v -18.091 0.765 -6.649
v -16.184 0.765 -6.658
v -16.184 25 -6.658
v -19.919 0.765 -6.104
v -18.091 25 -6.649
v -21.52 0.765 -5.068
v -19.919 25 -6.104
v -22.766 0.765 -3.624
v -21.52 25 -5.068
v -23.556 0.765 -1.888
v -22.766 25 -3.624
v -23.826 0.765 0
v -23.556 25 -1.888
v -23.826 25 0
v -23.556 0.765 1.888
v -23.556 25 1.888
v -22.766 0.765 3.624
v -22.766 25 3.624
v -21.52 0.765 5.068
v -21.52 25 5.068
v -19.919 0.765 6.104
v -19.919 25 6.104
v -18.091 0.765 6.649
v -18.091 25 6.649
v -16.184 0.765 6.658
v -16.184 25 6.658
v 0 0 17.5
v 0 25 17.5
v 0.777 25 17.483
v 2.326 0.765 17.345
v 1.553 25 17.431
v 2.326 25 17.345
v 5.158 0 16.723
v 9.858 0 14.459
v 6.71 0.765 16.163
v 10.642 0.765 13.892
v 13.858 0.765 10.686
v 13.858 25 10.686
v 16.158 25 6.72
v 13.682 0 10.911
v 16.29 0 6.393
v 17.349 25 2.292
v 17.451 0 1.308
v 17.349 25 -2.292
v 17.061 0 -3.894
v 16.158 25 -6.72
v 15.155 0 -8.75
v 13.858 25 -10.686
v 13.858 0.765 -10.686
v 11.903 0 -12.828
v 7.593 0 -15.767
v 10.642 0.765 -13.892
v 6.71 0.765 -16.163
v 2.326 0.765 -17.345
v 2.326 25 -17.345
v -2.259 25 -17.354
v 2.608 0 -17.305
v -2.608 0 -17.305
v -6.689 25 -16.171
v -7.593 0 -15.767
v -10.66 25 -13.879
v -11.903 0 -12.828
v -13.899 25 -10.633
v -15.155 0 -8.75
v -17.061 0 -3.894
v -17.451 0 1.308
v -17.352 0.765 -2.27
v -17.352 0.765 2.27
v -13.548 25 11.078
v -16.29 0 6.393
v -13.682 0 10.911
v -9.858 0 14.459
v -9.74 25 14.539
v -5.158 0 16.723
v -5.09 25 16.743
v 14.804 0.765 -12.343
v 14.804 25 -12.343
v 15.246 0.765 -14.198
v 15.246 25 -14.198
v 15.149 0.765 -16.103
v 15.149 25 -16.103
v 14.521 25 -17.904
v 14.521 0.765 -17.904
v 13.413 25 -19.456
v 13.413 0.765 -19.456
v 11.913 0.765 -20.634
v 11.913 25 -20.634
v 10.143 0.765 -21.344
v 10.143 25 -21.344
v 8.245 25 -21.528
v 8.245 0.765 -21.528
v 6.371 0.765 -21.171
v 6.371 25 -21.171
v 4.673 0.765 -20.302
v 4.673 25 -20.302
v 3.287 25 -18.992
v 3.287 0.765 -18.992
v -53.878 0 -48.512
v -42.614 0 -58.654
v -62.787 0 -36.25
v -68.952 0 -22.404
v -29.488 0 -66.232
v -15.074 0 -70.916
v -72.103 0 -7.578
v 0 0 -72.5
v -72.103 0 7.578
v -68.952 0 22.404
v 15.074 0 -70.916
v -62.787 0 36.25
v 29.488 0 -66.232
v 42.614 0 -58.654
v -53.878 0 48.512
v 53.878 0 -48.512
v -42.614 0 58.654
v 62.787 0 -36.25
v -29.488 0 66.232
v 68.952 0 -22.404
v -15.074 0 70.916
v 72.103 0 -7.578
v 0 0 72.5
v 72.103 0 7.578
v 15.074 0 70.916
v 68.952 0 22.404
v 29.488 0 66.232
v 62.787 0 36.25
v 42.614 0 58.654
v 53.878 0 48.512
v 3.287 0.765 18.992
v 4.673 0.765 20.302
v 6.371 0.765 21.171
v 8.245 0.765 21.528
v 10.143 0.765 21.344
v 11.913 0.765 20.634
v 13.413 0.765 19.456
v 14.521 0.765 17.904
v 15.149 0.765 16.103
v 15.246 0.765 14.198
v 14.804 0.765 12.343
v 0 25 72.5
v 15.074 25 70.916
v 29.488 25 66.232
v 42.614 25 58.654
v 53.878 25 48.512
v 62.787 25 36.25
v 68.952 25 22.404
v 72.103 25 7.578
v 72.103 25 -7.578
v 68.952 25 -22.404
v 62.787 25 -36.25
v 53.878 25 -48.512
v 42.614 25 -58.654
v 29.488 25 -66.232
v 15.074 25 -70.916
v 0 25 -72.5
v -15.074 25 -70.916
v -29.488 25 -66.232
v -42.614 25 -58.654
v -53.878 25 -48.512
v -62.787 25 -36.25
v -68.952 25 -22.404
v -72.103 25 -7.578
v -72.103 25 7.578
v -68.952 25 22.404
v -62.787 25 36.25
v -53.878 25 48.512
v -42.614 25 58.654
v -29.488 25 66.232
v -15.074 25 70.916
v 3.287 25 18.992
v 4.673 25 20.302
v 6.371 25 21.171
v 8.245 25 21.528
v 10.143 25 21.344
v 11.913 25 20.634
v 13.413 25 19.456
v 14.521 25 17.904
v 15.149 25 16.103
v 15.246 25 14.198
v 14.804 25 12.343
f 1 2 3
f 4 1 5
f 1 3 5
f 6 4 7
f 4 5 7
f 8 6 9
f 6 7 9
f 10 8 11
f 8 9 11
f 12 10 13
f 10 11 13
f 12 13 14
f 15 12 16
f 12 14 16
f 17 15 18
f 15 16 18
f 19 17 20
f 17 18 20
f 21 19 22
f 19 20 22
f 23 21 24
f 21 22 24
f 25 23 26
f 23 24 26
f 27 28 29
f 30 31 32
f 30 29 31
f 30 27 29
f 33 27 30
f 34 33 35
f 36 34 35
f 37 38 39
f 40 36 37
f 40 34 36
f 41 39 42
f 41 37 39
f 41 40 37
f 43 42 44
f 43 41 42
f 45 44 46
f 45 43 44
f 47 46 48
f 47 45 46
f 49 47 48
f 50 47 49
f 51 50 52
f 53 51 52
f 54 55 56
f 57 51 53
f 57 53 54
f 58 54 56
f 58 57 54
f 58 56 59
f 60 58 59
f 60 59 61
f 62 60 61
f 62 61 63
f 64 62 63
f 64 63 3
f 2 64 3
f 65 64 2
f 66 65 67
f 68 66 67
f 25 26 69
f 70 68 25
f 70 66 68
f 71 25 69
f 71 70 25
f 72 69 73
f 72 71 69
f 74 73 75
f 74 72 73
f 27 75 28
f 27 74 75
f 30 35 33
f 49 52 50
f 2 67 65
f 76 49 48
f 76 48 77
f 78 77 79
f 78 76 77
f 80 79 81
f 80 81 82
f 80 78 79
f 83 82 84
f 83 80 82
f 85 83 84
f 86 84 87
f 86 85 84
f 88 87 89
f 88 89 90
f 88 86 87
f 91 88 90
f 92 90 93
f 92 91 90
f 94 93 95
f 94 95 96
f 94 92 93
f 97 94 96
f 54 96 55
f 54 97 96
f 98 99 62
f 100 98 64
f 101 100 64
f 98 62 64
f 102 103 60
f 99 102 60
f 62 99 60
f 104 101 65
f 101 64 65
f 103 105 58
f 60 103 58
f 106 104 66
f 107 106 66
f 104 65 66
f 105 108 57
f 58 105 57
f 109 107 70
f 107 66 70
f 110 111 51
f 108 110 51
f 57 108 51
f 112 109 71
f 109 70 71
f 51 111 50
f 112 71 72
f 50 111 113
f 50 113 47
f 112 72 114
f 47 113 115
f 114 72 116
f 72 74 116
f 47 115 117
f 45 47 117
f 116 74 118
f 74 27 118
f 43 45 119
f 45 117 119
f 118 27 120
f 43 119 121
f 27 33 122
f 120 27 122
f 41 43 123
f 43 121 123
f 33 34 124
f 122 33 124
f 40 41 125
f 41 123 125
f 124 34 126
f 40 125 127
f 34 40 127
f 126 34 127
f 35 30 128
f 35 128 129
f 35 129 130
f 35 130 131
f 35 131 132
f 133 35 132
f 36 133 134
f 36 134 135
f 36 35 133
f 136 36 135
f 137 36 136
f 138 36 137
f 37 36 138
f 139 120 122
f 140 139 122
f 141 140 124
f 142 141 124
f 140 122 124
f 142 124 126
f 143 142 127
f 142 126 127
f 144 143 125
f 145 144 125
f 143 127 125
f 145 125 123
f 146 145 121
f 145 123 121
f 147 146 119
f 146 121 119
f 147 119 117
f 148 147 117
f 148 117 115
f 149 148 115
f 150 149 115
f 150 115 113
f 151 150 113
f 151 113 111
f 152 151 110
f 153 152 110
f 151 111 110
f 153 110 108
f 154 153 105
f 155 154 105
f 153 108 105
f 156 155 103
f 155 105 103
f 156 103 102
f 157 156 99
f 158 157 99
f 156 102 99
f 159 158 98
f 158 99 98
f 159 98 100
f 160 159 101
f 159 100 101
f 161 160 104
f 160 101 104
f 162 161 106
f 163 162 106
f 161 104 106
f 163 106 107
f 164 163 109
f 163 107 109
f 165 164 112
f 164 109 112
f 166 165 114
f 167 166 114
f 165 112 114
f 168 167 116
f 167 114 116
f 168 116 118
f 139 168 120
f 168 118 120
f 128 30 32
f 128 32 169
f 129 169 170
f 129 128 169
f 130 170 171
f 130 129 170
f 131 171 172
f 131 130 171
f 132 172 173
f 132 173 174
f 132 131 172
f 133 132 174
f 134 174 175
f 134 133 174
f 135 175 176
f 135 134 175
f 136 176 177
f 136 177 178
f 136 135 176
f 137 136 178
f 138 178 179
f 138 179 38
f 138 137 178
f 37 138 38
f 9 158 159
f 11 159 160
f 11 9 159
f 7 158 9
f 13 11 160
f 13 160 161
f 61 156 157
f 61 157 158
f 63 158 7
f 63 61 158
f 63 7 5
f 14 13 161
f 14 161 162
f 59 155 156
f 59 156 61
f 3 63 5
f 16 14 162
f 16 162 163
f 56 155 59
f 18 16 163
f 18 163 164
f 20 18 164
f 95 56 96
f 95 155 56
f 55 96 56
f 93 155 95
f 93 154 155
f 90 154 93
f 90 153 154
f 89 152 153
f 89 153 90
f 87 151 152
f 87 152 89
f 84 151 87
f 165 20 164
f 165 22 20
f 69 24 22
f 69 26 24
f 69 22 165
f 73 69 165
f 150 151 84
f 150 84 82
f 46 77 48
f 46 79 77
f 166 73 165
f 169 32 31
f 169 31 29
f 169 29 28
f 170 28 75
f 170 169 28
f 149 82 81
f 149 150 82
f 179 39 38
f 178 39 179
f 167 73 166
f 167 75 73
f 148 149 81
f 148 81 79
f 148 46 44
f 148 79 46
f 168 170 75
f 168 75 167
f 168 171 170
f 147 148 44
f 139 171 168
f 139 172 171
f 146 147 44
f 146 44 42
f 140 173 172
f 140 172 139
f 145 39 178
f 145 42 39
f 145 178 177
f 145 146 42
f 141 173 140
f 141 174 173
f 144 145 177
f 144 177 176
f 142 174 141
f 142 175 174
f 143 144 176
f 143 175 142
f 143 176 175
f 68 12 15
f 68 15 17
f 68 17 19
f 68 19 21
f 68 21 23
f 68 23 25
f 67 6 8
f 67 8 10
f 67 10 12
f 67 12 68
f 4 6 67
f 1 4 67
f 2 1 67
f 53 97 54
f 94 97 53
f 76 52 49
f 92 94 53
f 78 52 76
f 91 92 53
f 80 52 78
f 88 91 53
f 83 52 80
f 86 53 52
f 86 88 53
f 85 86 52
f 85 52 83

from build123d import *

# Parameters (mm, degrees)
SKETCH1_R           = 72.5
BOSS_EXTRUDE1_DEPTH = 25
SKETCH2_R           = 17.5
CUT_EXTRUDE1_DEPTH  = 106.534354596
SKETCH3_R           = 6.721755304
CUT_EXTRUDE2_DEPTH  = 24.234624301
CIRPATTERN1_COUNT   = 3


with BuildPart() as part:
    # Sketch1 → Boss-Extrude1 (new body)
    with BuildSketch(Plane(origin=(0, 0, 0), x_dir=(1, 0, 0), z_dir=(0, 1, 0))):
        Circle(SKETCH1_R)
    extrude(amount=BOSS_EXTRUDE1_DEPTH)

    # Sketch2 → Cut-Extrude1 (cut, through all)
    with BuildSketch(Plane(origin=(0, 0, 0), x_dir=(1, 0, 0), z_dir=(0, 1, 0))):
        Circle(SKETCH2_R)
    extrude(amount=CUT_EXTRUDE1_DEPTH, mode=Mode.SUBTRACT)

    # Sketch3 → Cut-Extrude2 (cut)
    with BuildSketch(Plane(origin=(0, 25, 0), x_dir=(1, 0, 0), z_dir=(0, 1, 0))):
        with Locations((-17.104622237, 0)):
            Circle(SKETCH3_R)
    cut_extrude2 = extrude(amount=-CUT_EXTRUDE2_DEPTH, mode=Mode.SUBTRACT)

    # CirPattern1: Cut-Extrude2 ×3 about axis
    cirpattern1_axis = Axis((0, 0, 0), (0, 1, 0))
    for i in range(1, CIRPATTERN1_COUNT):
        add(cut_extrude2.rotate(cirpattern1_axis, i * 360 / CIRPATTERN1_COUNT), mode=Mode.SUBTRACT)


solid = part.part
